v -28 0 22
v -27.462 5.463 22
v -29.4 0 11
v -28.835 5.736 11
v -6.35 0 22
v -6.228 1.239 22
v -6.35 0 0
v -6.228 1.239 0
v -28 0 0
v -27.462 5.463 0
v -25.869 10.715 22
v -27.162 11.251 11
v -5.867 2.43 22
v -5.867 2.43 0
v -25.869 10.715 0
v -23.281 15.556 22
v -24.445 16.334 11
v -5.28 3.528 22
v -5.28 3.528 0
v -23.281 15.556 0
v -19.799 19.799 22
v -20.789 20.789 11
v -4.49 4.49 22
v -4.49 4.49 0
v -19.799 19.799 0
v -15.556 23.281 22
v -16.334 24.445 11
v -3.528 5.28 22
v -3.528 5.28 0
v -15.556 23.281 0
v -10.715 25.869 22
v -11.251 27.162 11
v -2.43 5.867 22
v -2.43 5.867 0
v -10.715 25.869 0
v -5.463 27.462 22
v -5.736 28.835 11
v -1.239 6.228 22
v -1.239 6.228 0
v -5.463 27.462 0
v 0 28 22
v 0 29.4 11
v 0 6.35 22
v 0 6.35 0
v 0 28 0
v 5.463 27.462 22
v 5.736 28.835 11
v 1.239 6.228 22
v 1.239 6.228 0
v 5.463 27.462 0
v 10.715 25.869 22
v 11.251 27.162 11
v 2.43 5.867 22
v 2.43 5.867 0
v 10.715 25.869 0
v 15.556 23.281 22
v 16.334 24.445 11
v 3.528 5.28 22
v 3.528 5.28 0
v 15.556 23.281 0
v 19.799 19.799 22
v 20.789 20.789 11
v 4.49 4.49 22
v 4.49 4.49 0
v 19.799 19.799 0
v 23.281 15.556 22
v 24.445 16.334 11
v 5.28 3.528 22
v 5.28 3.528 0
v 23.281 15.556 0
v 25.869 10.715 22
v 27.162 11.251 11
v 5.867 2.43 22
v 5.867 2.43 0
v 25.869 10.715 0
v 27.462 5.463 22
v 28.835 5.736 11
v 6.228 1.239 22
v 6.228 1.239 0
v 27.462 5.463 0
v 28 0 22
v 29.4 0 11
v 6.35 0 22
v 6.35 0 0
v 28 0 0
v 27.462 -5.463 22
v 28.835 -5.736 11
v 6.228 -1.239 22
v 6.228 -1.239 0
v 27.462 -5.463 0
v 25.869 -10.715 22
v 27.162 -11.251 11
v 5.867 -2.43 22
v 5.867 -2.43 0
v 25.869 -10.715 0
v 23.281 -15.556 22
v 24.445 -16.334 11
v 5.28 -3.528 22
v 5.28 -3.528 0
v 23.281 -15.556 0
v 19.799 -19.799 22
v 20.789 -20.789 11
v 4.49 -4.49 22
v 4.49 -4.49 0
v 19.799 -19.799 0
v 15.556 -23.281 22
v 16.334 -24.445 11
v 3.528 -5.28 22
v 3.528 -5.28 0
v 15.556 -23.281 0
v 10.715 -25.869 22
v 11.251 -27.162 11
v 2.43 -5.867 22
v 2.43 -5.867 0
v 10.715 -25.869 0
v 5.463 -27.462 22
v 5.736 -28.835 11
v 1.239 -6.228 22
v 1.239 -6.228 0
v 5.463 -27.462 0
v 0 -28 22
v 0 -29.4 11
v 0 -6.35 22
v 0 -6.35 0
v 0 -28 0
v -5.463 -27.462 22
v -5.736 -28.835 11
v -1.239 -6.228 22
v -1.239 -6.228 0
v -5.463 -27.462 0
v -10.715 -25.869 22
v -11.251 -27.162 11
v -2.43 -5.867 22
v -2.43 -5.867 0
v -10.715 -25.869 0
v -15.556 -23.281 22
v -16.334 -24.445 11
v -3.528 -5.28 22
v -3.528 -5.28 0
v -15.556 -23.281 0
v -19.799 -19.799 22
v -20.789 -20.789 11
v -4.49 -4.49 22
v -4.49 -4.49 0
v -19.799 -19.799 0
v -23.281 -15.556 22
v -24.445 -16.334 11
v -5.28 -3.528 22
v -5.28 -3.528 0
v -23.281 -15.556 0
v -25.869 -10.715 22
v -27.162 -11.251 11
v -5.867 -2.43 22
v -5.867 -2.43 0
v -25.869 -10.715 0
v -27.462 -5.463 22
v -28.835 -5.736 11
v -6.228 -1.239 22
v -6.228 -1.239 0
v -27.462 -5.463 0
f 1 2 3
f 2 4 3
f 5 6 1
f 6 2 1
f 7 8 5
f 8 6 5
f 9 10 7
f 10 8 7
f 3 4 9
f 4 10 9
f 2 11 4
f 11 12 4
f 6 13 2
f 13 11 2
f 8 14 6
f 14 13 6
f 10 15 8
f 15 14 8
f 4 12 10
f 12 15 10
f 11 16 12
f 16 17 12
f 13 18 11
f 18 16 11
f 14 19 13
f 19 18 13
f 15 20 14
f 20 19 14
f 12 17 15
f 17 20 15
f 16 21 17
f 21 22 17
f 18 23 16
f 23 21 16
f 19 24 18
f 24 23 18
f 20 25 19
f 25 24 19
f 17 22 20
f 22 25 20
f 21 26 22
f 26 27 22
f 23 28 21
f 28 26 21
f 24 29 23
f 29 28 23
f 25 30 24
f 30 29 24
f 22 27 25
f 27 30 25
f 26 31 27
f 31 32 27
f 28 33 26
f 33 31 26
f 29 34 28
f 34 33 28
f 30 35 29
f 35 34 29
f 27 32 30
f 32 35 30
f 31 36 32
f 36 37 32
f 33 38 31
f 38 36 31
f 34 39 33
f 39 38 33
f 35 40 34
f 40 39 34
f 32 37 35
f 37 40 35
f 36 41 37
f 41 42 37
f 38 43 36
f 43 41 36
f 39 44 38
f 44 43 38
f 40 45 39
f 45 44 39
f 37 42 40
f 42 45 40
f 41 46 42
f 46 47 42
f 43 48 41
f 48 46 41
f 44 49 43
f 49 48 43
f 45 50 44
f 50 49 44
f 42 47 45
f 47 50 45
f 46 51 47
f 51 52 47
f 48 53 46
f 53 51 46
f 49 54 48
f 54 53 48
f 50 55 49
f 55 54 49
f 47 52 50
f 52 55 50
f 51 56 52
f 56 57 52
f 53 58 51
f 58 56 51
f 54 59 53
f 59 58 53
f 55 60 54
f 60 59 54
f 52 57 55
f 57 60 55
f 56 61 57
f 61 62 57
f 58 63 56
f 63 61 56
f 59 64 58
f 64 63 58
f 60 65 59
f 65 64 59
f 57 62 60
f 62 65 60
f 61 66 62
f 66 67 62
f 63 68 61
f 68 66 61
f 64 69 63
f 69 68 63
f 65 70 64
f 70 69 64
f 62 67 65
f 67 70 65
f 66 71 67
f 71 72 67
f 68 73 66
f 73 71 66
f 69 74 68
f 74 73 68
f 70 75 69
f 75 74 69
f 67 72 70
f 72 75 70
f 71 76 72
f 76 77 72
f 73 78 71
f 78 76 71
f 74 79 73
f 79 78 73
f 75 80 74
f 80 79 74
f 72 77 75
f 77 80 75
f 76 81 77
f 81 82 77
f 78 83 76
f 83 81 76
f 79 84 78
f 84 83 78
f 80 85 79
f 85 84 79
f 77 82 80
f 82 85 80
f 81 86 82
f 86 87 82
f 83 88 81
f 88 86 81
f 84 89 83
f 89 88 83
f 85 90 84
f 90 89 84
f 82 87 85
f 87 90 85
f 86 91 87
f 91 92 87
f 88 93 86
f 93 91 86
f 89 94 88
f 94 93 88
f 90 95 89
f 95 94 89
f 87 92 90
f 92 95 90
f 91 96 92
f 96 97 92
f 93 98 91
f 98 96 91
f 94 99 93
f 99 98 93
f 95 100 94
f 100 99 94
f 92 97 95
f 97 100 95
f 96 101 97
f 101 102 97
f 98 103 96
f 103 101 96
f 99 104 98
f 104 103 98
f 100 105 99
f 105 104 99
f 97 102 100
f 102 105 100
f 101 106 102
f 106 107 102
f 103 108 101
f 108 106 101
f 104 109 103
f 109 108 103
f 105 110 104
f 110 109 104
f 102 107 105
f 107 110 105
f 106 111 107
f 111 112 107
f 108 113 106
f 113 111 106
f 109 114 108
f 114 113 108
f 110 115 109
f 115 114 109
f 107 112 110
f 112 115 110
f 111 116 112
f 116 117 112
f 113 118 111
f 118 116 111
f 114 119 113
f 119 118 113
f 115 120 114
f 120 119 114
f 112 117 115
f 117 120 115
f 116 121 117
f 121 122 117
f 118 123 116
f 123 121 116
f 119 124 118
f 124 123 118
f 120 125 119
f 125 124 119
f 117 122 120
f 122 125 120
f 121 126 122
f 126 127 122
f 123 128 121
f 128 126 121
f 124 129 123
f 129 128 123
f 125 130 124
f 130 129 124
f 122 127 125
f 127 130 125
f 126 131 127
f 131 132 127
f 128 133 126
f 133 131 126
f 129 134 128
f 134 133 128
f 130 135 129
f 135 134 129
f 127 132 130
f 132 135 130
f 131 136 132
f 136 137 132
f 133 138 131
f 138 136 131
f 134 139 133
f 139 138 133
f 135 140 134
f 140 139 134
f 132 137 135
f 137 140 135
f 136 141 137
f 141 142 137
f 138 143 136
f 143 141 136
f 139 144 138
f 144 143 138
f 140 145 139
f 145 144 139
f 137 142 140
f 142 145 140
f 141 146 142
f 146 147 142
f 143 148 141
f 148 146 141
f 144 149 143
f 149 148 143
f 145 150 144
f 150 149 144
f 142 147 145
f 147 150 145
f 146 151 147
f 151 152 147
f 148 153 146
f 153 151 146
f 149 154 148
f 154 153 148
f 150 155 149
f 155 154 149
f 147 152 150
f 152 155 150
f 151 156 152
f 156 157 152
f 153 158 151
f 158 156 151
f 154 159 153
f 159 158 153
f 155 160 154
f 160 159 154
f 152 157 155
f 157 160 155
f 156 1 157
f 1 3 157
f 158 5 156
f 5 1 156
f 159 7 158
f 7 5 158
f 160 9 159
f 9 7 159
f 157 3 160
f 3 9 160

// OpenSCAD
$fn = 32;

// ----------------------------------------------------------------------
// Belt roller: 56 mm barrel, 22 mm wide, bore 12.7 mm
// ----------------------------------------------------------------------

// --- parameters (mm) ---
bore_d = 12.7;            // bore
barrel_d = 56;            // barrel diameter
roller_w = 22;            // roller width
crown = 1.4;              // crown height at mid width

roller_profile = [[6.35, 0], [28, 0], [29.4, 11], [28, 22], [6.35, 22]];

/* the profile stays clear of the axis, so the bore comes out of the revolve */
rotate_extrude() polygon(roller_profile);
